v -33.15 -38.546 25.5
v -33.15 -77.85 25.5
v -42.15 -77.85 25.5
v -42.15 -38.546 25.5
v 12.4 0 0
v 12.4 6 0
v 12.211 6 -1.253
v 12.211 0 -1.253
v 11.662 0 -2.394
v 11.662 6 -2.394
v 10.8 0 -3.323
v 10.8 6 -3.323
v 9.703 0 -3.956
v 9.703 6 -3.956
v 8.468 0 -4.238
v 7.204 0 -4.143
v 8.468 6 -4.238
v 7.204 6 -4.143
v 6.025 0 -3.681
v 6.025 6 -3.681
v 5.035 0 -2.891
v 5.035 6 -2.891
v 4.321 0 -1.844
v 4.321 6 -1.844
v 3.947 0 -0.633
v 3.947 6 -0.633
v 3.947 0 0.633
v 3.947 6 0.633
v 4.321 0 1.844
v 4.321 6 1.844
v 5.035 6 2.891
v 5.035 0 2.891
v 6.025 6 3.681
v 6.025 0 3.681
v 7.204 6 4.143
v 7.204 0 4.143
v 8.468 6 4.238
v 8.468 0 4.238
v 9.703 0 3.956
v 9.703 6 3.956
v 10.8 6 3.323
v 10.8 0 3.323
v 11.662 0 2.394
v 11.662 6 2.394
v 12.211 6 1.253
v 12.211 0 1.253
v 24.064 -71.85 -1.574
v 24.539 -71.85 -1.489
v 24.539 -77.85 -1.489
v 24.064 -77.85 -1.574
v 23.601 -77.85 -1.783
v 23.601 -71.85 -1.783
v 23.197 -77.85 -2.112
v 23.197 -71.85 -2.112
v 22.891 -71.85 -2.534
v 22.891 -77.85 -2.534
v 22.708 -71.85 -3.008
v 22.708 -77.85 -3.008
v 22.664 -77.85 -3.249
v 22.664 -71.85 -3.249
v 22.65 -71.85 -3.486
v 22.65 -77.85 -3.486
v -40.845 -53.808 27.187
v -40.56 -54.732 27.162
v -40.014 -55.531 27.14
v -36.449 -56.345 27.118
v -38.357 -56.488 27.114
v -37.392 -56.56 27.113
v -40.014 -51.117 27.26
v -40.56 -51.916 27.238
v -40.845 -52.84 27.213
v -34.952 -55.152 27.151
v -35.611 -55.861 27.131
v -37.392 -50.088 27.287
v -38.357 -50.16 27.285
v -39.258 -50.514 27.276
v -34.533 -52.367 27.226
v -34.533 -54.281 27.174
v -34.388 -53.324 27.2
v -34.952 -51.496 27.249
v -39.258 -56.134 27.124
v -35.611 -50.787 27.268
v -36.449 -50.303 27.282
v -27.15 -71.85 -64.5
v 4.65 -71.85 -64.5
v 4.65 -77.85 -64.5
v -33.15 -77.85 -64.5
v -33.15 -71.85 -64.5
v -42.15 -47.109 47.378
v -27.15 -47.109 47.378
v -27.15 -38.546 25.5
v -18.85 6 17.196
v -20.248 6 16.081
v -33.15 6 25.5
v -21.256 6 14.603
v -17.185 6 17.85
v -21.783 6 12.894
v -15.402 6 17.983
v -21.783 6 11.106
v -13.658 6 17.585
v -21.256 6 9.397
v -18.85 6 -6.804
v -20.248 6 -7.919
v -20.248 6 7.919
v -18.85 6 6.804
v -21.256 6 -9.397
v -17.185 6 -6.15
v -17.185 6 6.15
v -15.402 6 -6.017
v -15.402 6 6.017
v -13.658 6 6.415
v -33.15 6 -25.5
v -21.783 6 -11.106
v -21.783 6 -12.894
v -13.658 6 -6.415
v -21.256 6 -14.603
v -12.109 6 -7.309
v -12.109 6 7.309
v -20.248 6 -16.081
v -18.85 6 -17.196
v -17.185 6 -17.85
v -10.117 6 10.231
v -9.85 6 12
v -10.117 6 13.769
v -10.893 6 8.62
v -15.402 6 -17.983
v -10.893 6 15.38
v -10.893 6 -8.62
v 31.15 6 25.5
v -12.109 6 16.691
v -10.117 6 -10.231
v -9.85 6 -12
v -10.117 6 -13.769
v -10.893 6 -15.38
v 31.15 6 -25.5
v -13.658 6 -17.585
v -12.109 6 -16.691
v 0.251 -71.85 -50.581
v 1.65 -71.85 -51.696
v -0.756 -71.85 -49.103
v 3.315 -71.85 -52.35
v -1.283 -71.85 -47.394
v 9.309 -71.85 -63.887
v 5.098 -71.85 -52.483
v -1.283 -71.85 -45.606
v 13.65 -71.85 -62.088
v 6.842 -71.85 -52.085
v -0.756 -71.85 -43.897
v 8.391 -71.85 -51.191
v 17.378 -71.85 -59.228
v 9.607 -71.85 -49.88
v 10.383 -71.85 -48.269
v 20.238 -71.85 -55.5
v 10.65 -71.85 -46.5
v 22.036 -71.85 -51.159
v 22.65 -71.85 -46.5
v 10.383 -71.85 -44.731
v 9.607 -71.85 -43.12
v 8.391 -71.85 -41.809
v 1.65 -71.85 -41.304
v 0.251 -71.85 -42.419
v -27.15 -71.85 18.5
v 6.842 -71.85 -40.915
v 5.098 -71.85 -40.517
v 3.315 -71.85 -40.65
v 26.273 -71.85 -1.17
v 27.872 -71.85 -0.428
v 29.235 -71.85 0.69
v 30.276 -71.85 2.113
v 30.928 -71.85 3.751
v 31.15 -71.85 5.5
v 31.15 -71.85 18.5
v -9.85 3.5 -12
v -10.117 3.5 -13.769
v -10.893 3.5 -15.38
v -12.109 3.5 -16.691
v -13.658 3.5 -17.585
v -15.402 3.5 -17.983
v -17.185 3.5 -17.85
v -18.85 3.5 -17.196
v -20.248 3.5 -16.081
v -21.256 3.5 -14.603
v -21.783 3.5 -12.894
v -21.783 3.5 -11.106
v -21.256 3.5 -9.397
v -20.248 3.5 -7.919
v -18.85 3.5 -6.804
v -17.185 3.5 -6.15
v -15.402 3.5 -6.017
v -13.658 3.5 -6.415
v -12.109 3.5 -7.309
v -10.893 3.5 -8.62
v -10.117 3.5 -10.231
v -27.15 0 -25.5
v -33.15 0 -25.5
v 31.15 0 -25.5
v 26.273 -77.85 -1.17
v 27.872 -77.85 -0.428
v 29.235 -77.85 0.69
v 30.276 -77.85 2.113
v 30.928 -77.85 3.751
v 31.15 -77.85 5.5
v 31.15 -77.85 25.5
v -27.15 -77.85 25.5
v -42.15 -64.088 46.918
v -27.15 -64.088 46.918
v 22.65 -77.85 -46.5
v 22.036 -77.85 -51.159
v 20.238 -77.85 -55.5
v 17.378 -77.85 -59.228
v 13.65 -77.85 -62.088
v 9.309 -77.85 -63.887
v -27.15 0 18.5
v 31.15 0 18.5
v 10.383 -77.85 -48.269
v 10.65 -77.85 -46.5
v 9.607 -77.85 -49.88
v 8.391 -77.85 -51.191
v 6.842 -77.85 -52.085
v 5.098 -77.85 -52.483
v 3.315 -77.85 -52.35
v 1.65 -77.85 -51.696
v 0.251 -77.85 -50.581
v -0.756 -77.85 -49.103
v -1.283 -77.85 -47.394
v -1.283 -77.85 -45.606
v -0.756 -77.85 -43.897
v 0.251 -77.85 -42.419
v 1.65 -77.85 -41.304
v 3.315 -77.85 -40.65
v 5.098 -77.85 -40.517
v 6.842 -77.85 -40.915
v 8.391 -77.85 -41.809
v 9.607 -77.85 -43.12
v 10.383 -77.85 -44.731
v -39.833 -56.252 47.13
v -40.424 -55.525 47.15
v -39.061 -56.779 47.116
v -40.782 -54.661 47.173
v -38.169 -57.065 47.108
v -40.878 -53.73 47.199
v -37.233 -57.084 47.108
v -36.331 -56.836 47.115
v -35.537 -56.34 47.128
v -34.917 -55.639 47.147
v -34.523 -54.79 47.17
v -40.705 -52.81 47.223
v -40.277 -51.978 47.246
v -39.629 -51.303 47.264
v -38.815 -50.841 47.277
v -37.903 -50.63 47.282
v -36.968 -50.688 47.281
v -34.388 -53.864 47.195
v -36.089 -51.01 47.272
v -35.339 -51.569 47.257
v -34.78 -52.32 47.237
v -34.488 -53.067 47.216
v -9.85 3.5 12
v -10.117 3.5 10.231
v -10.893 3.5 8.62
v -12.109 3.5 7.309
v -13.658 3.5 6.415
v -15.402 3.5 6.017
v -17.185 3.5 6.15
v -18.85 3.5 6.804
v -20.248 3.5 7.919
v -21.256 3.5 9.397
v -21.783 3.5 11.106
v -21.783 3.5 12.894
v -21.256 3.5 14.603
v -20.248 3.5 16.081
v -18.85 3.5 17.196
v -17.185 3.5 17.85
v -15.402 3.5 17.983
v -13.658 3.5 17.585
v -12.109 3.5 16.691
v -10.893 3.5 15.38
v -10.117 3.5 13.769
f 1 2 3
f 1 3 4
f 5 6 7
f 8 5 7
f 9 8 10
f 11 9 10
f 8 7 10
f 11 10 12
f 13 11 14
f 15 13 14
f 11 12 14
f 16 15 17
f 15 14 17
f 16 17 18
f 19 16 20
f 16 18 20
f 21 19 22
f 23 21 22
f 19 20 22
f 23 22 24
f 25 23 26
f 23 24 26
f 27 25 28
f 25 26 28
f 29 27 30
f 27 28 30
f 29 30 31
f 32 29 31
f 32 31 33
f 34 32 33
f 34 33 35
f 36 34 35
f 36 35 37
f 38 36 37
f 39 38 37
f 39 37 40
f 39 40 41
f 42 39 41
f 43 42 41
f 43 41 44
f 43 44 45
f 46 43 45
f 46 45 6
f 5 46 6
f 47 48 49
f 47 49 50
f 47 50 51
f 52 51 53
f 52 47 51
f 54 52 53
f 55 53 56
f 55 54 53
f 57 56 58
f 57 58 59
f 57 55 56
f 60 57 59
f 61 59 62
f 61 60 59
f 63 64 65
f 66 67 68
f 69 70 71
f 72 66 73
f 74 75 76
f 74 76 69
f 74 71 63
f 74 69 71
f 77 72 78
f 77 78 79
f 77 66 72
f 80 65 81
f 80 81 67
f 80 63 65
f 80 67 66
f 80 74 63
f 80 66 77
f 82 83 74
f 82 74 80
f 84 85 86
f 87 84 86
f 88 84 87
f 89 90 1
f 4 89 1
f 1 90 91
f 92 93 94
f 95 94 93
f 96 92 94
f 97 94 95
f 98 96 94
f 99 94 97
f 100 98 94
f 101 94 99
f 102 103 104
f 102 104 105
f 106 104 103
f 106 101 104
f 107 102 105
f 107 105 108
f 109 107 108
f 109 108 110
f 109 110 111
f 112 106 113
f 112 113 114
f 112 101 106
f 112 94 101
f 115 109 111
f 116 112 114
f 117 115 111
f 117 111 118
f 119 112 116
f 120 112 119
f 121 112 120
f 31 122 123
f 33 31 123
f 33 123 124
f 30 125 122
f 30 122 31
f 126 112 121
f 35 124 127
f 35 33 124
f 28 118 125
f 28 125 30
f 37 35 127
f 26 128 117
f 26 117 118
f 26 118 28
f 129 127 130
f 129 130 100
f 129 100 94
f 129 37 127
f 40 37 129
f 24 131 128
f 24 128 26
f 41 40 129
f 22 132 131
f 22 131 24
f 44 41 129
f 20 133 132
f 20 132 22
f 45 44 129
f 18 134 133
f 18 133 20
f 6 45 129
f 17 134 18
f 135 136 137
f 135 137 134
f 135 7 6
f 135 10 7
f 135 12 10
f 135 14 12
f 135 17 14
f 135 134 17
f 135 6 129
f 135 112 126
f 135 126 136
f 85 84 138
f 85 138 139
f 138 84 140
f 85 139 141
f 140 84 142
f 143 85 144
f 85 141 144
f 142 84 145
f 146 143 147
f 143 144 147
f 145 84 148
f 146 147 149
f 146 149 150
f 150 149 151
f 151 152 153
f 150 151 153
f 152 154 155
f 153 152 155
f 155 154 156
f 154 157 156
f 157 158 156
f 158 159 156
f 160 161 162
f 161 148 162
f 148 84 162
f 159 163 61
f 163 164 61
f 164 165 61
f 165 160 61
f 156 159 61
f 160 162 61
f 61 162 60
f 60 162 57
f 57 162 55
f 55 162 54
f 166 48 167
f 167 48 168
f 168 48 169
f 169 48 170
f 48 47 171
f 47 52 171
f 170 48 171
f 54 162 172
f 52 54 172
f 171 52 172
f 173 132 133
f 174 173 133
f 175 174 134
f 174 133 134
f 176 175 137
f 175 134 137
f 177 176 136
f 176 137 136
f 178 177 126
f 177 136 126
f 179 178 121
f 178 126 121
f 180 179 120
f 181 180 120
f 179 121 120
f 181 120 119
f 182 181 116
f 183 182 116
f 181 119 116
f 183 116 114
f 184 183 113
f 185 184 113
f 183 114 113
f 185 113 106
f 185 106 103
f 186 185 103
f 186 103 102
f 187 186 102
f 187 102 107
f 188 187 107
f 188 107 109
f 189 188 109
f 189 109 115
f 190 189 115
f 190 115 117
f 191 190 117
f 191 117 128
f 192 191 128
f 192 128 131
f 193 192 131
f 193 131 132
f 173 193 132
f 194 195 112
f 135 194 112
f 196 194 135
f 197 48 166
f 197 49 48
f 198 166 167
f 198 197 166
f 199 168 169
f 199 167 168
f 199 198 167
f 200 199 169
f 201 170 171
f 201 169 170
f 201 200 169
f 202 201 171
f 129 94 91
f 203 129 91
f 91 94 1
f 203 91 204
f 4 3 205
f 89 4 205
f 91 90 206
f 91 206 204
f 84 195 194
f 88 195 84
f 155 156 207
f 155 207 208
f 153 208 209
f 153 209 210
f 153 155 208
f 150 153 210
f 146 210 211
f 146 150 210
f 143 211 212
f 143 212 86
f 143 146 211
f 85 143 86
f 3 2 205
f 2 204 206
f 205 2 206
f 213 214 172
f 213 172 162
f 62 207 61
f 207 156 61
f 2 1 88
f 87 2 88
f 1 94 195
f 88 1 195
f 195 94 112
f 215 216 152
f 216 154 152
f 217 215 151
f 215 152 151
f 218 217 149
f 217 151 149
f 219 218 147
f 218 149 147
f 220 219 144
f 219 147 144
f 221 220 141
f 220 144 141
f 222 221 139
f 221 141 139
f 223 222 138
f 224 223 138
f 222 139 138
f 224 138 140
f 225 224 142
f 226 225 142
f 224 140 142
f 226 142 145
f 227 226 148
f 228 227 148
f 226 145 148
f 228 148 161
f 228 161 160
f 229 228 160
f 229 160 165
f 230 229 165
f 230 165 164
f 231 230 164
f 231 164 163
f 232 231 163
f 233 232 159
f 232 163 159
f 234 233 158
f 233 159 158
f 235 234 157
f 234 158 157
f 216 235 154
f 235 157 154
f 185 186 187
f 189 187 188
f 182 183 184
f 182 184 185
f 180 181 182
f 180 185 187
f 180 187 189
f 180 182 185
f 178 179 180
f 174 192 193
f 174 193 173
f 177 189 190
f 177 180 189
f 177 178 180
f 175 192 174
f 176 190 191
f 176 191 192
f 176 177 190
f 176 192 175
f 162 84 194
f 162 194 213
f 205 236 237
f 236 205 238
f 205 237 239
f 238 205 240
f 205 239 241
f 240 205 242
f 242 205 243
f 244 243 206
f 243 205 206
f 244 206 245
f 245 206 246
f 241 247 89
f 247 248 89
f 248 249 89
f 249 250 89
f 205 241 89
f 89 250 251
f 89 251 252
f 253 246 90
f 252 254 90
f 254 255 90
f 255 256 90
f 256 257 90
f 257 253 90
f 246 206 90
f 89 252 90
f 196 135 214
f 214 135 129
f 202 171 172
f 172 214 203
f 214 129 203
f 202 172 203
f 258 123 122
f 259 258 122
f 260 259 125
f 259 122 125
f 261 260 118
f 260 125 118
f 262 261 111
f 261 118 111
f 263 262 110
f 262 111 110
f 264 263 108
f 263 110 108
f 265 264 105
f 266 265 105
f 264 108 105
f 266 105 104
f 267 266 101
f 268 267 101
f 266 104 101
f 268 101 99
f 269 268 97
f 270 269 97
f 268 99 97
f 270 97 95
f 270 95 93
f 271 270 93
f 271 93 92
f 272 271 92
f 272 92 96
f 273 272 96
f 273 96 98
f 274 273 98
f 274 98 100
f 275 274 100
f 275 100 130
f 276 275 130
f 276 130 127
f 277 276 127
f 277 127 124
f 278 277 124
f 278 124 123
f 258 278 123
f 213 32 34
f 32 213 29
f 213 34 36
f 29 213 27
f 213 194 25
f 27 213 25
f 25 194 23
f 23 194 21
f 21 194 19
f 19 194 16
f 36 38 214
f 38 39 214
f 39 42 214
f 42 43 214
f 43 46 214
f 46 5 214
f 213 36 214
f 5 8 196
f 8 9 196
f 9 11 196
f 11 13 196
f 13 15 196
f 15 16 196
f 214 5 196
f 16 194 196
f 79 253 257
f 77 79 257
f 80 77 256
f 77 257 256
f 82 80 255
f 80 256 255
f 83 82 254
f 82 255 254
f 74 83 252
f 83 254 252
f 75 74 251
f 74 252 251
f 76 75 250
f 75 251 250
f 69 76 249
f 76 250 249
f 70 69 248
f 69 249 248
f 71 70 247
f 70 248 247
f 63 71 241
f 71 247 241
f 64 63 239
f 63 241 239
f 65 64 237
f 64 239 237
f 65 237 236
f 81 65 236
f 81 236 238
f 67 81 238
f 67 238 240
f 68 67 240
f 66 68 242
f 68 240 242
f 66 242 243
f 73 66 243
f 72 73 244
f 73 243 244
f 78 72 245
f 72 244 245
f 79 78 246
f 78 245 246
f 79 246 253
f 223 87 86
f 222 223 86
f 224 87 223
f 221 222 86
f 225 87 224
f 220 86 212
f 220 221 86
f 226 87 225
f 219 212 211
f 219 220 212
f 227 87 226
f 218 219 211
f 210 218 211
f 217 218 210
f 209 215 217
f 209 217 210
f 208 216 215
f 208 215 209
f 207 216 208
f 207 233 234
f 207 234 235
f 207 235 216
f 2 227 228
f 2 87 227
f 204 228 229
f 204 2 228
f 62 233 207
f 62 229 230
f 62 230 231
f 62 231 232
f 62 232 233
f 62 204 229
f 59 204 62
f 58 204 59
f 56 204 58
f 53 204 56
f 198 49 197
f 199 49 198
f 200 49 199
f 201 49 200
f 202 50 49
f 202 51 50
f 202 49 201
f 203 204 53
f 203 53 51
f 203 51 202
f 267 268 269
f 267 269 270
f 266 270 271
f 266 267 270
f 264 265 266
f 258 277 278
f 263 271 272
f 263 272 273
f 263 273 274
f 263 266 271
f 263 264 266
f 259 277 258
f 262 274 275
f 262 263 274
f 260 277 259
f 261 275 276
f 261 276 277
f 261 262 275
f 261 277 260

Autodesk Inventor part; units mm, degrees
ref_plane "YZ Plane" through (0, 0, 0) normal (1, 0, 0) x (0, 1, 0)
ref_plane "XZ Plane" through (0, 0, 0) normal (0, 1, 0) x (-1, 0, 0)
ref_plane "XY Plane" through (0, 0, 0) normal (0, 0, 1) x (1, 0, 0)
sketch "Sketch1" plane through (0, 0, 0) normal (0, 1, 0) x (-1, 0, 0)
  line L0 (0, -25.5) -> (-34.15, -25.5)
  line L1 (-34.15, -25.5) -> (-34.15, 0)
  line L2 (-34.15, 0) -> (-34.15, 25.5)
  line L3 (-34.15, 25.5) -> (0, 25.5)
  line L4 (0, 25.5) -> (34.15, 25.5)
  line L5 (34.15, 25.5) -> (34.15, 0)
  line L6 (34.15, 0) -> (34.15, -25.5)
  line L7 (34.15, -25.5) -> (0, -25.5)
  point P0 (0, 0)
extrude "Extrusion1" add sketch "Sketch1" along normal blind 7
sketch "Sketch3" plane through (-34.15, 0, 25.5) normal (0, 0, 1) x (1, 0, 0)
  line L0 (0, 0) -> (0, -78.85)
  point P0 (34.15, 0)
  dimension "d7" = 78.85
sketch "Sketch4" plane through (-34.15, 0, -25.5) normal (-1, 0, 0) x (0, 0, 1)
  line L0 (51, 0) -> (51, -78.85)
  line L1 (51, -78.85) -> (-39, -78.85)
  line L2 (-39, -78.85) -> (-39, -71.85)
  line L3 (0, 0) -> (-39, -71.85)
  line L4 (0, 0) -> (51, 0)
  point P0 (25.5, 0)
  dimension "d10" = 90
  dimension "d11" = 7
extrude "Extrusion2" add sketch "Sketch4" against normal blind 7
sketch "Sketch6" plane through (0, 7, 0) normal (0, 1, 0) x (1, 0, 0)
  line L0 (34.15, -25.5) -> (34.15, 25.5) projected
  line L1 (34.15, 25.5) -> (34.15, 0)
  line L2 (-34.15, 25.5) -> (-34.15, -25.5) projected
  circle A0 centre (8.15, 0) radius 5
  point P0 (0, 0)
  dimension "d20" = 10
extrude "Extrusion4" cut sketch "Sketch6" against normal blind 10
sketch "Sketch7" plane through (-27.15, 0, -25.5) normal (1, 0, 0) x (0, 0, -1)
  line L0 (-51, -78.85) -> (39, -78.85) projected
  line L1 (-51, -78.85) -> (39, -78.85)
  line L2 (39, -78.85) -> (39, -71.85) projected
  line L3 (39, -78.85) -> (39, -71.85)
  line L4 (39, -71.85) -> (-51, -71.85)
  line L5 (-51, 0) -> (-51, -78.85) projected
  line L6 (-51, -78.85) -> (-51, -71.85)
  point P0 (-25.5, 0)
sketch "Sketch8" plane through (0, 0, 0) normal (0, -1, 0) x (1, 0, 0)
  circle A0 centre (8.15, 0) radius 5 projected
  line L0 (8.15, 18.5) -> (34.15, 18.5)
  line L1 (34.15, 25.5) -> (34.15, -25.5) projected
  line L2 (8.15, 25.5) -> (34.15, 25.5)
  line L3 (8.15, 25.5) -> (-27.15, 25.5)
  line L4 (-27.15, 25.5) -> (-27.15, -25.5) projected
  line L5 (8.15, 18.5) -> (-27.15, 18.5)
  line L6 (34.15, 25.5) -> (34.15, 18.5)
  line L7 (-27.15, 25.5) -> (-27.15, 18.5)
  point P0 (0, 0)
extrude "Extrusion6" add sketch "Sketch7" along normal blind 58.5
extrude "Extrusion7" add sketch "Sketch8" along normal blind 78.75 contours L5 L4 L3 L2 L1 L0
sketch "Sketch9" plane through (31.35, 0, -25.5) normal (1, 0, 0) x (0, 0, -1)
  line L0 (-51, -78.75) -> (-51, 7) projected
  line L1 (-44, 0) -> (-44, -71.85) projected
  line L2 (-51, -78.75) -> (-44, -78.75)
  line L3 (-44, -78.75) -> (-44, -71.85)
  line L4 (-44, -71.85) -> (-51, -71.85)
  line L5 (-51, -71.85) -> (-51, -78.75)
  point P0 (-25.5, 0)
extrude "Extrusion8" cut sketch "Sketch9" along normal blind 10
sketch "Sketch10" plane through (0, 7, 0) normal (0, 1, 0) x (1, 0, 0)
  point P0 (0, 0)
sketch "Boceto11" plane through (-34.15, -78.85, -64.5) normal (0, -1, 0) x (1, 0, 0)
  line L0 (72.0718, 89.9914) -> (72.0718, 37.9883)
  line L1 (72.0718, 37.9883) -> (65.5278, 37.9883)
  line L2 (65.5278, 37.9883) -> (65.5278, 89.9914)
  line L3 (72.0718, 89.9914) -> (72.0718, 92.1751)
  line L4 (72.0718, 92.1751) -> (65.5278, 92.1751)
  line L5 (65.5278, 92.1751) -> (65.5278, 89.9914)
  point P0 (34.15, 64.5)
extrude "Extrusión9" cut sketch "Boceto11" against normal blind 1000
sketch "Boceto18" plane through (-34.15, -78.85, 25.5) normal (0, 0, 1) x (1, 0, 0)
  point P0 (34.15, 78.85)
sketch "Boceto23" plane through (-27.15, 0, -25.5) normal (0, 0.4771, -0.8789) x (-1, 0, 0)
  point P0 (-27.15, 12.1648)
sketch "Boceto24" plane through (-27.15, 0, -25.5) normal (0, 0, -1) x (-1, 0, 0)
  line L0 (7, -71.85) -> (7, -78.85) projected
  line L1 (7, -78.35) -> (7, -78.85)
  line L2 (7, -78.85) -> (-58.5, -78.85) projected
  line L3 (-58.5, -78.85) -> (-58.5, -77.85)
  line L4 (-58.5, -71.85) -> (-58.5, -78.85) projected
  line L5 (-58.5, -77.85) -> (6, -77.85)
  line L6 (7, -77.85) -> (7, -78.85)
  line L7 (7, -78.85) -> (-58.8392, -78.85)
  line L8 (-58.5278, 7) -> (7, 7) projected
  line L9 (7, -78.85) -> (7, 7)
  line L10 (7, 7) -> (6, 7)
  line L11 (6, 6) -> (6, -77.85)
  line L12 (-58.5278, -71.85) -> (-58.5278, 7) projected
  line L13 (-58.5278, 7) -> (-58.5278, 6)
  line L14 (-58.5278, 6) -> (6, 6)
  line L15 (7, 0) -> (7, 7) projected
  line L16 (7, 6) -> (7, 7)
  line L17 (7, 7) -> (-58.5278, 7)
  point P0 (-27.15, 0)
  dimension "d65" = 1
  dimension "d66" = 1
  dimension "d67" = 1
extrude "Extrusión19" cut sketch "Boceto24" along normal mid plane 1000
sketch "Boceto25" plane through (31.35, -71.85, -64.5) normal (0, 0, -1) x (-1, 0, 0)
  point P0 (31.35, 71.85)
sketch "Boceto27" plane through (31.3778, 0, -25.5) normal (0, 0, -1) x (-1, 0, 0)
  line L0 (0, -71.85) -> (0, 6) projected
  line L1 (0, 6) -> (0.228, 6)
  line L2 (0, 6) -> (64.5278, 6) projected
  line L3 (0.228, 6) -> (0.228, -77.85)
  line L4 (0.0278, -77.85) -> (64.5278, -77.85) projected
  line L5 (0.0278, -71.85) -> (0.0278, -77.85) projected
  line L6 (0.228, -77.85) -> (0.0278, -77.85)
  line L7 (0.0278, -77.85) -> (0, 6)
  line L8 (0, 6) -> (0, -77.85)
  line L9 (0, -77.85) -> (0.0278, -77.85)
  point P0 (31.3778, 0)
  dimension "d73" = 0.228
extrude "Extrusión21" cut sketch "Boceto27" along normal mid plane 1000
sketch "Boceto28" plane through (-33.15, 0, -25.5) normal (-1, 0, 0) x (0, 0, 1)
  point P0 (25.5, 0)
sketch "Boceto30" plane through (-33.15, 0, -25.5) normal (-1, 0, 0) x (0, 0, 1)
  point P0 (25.5, 0)
sketch "Boceto31" plane through (-33.15, 0, -25.5) normal (-1, 0, 0) x (0, 0, 1)
  circle A0 centre (64.38, -38.5153) radius 2.6
  point P0 (25.5, 0)
  point P1 (64.38, -49.4573)
sketch "Boceto32" plane through (-27.15, -71.85, 18.5) normal (0, 1, 0) x (1, 0, 0)
  circle A0 centre (47, 71.5) radius 5 projected
  circle A1 centre (47, 71.5) radius 5
  line L0 (52, 71.5) -> (58.2998, 71.5)
  line L1 (67, 83) -> (67, -7)
  line L2 (58.2998, -7) -> (-6, -7) projected
  line L3 (67, -7) -> (58.2998, -7)
  line L4 (58.2998, -7) -> (58.2998, 83)
  line L5 (47, 76.5) -> (47, 83)
  line L6 (-6, 83) -> (0, 83) projected
  line L7 (-6, 83) -> (-6, 91.5)
  line L8 (-6, 91.5) -> (67, 91.5)
  line L9 (67, 91.5) -> (67, 83)
  line L10 (-6, 83) -> (58.2998, 83)
  point P0 (27.15, 18.5)
extrude "Extrusión23" add sketch "Boceto32" against normal blind 6 contours L4 L10 L6 L7 L8 L9 L1 L3
sketch "Boceto33" plane through (-33.15, -77.85, 25.5) normal (-1, 0, 0) x (0, 0, 1)
  line L0 (0, 83.85) -> (0, 0) projected
  line L1 (0, 74.4354) -> (10.1255, 74.4354)
  line L2 (10.1255, 74.4354) -> (10.1255, 56.6115)
  line L3 (10.9445, 54.9975) -> (18.0243, 49.8171)
  line L4 (18.8039, 48.5979) -> (20.1084, 42.1205)
  line L5 (0, 11.6181) -> (18.1478, 11.6181)
  line L6 (20.1478, 13.6181) -> (20.1478, 41.7256)
  arc A0 (10.1255, 56.6115) -> (10.9445, 54.9975) centre (12.1255, 56.6115) ccw
  arc A1 (18.8039, 48.5979) -> (18.0243, 49.8171) centre (16.8433, 48.203) ccw
  arc A2 (20.1478, 41.7256) -> (20.1084, 42.1205) centre (18.1478, 41.7256) ccw
  arc A3 (18.1478, 11.6181) -> (20.1478, 13.6181) centre (18.1478, 13.6181) ccw
  point P0 (-25.5, 77.85)
  dimension "d91" = 2
extrude "Extrusión24" add sketch "Boceto33" against normal blind 6
extrude "Extrusión25" cut sketch "Boceto31" against normal blind 6
sketch "Boceto34" plane through (-27.15, -77.85, 25.5) normal (1, 0, 0) x (0, 0, -1)
  line L0 (-18.1478, 11.6181) -> (-21.8775, 11.6181)
  line L1 (-21.8775, 11.6181) -> (-21.8775, 48.067)
  line L2 (-21.8775, 48.067) -> (-10.1255, 56.8358)
  line L3 (-10.1255, 74.4354) -> (-10.1255, 56.6115) projected
  line L4 (-10.1255, 56.8358) -> (-10.1255, 48.9642)
  line L5 (-10.1255, 48.9642) -> (-16.6729, 42.1735)
  line L6 (-16.6729, 42.1735) -> (-18.1478, 11.6181)
  point P0 (25.5, 77.85)
extrude "Extrusión26" add sketch "Boceto34" against normal blind 6
fillet "Empalme5" radius 10 3 edges at (-30.15, -21.0142, 35.6255) (-30.15, -29.783, 47.3775) (-30.15, -66.2319, 47.3775)
sketch "Boceto37" plane through (-33.15, 6, 25.5) normal (0, 1, 0) x (1, 0, 0)
  circle A0 centre (41.3, 25.5) radius 6 projected
  line L0 (41.3, 25.5) -> (17.3, 25.5)
  line L1 (17.3, 25.5) -> (17.3, 13.5)
  line L2 (17.3, 13.5) -> (17.3, 37.5)
  circle A1 centre (17.3, 13.5) radius 6
  circle A2 centre (17.3, 37.5) radius 6
  point P0 (33.15, 25.5)
  dimension "d106" = 24
  dimension "d107" = 12
  dimension "d108" = 24
  dimension "d109" = 12
  dimension "d110" = 12
extrude "Extrusión29" cut sketch "Boceto37" against normal blind 2.5 contours A1 | A2
sketch "Boceto39" plane through (-27.15, -71.85, 18.5) normal (0, 1, 0) x (1, 0, 0)
  line L0 (58.2998, -7) -> (58.2998, 0)
  line L1 (58.2998, 44) -> (58.2998, 91.5)
  line L2 (-6, 91.5) -> (67, 91.5) projected
  line L3 (0, 0) -> (58.2998, 0) projected
  line L4 (58.2998, 0) -> (58.2998, -7) projected
  line L5 (58.2998, -7) -> (67, -7) projected
  line L6 (58.2998, -7) -> (67, -7)
  line L7 (67, 91.5) -> (-6, 91.5) projected
  line L8 (67, -7) -> (67, 91.5)
  line L9 (67, 91.5) -> (58.2998, 91.5)
  line L10 (58.2998, 0) -> (58.2998, 44)
  point P0 (27.15, 18.5)
extrude "Extrusión31" cut sketch "Boceto39" against normal blind 10
sketch "Boceto41" plane through (-27.15, -71.85, 18.5) normal (0, 1, 0) x (1, 0, 0)
  line L0 (58.2998, 91.5) -> (58.2998, -7) projected
  line L1 (58.2998, 91.5) -> (31.7998, 91.5)
  line L2 (31.7998, 91.5) -> (31.7998, 65)
  line L3 (31.7998, 65) -> (58.2998, 65)
  line L4 (58.2998, 65) -> (58.2998, 91.5)
  circle A0 centre (31.7998, 65) radius 6
  point P0 (27.15, 18.5)
  dimension "d124" = 26.5
  dimension "d125" = 26.5
  dimension "d126" = 12
extrude "Extrusión32" cut sketch "Boceto41" against normal blind 10 contours A0 L2 L3 | L3 L2 A0
sketch "Sketch42" plane through (-27.15, -71.85, 18.5) normal (0, 1, 0) x (1, 0, 0)
  circle A0 centre (31.7998, 65) radius 6 projected
  line L0 (31.7998, 71) -> (31.7998, 65)
  circle A1 centre (31.7998, 65) radius 18
  line L1 (0, 0) -> (0, 83) projected
  line L2 (0, 83) -> (31.7998, 83)
  line L3 (58.2998, 91.5) -> (-6, 91.5) projected
  line L4 (49.7998, 65) -> (49.7998, 0)
  line L5 (58.2998, 0) -> (0, 0) projected
  line L6 (0, 0) -> (58.2998, 0) projected
  line L7 (49.7998, 0) -> (58.2998, 0)
  line L8 (58.2998, 91.5) -> (58.2998, -7) projected
  line L9 (58.2998, 0) -> (58.2998, 91.5)
  line L10 (0, 83) -> (0, 44) projected
  line L11 (0, 83) -> (-6, 83)
  line L12 (-6, 91.5) -> (-6, 83) projected
  line L13 (-6, 83) -> (-6, 91.5)
  line L14 (58.2998, 91.5) -> (58.2998, 0) projected
  line L15 (-6, 91.5) -> (58.2998, 91.5)
  point P0 (27.15, 18.5)
  point P1 (58.2998, -7)
  dimension "d129" = 36
extrude "Extrusion33" cut sketch "Sketch42" against normal blind 10 contours A1 L2 L11 L12 L3 L8 L5 L4
sketch "Sketch43" plane through (-27.15, -71.85, 18.5) normal (0, 0, -1) x (-1, 0, 0)
  line L0 (6, -6) -> (-58.2998, -6) projected
  line L1 (0, 0) -> (-49.7998, 0) projected
  line L2 (-58.2998, -6) -> (-49.7998, -6)
  line L3 (-49.7998, -6) -> (-49.7998, 0)
  line L4 (-49.7998, 0) -> (-58.2998, 0)
  line L5 (-58.2998, 0) -> (-58.2998, -6)
  point P0 (-27.15, 71.85)
extrude "Extrusion34" add sketch "Sketch43" along normal blind 20
fillet "Fillet7" radius 7 1 edges at (31.1498, -74.85, -1.5)
fillet "Fillet8" radius 2 1 edges at (22.6498, -74.85, -1.5)
sketch "Sketch44" plane through (-33.15, 0, -25.5) normal (-1, 0, 0) x (0, 0, 1)
  line L0 (68.8577, -26.7837) -> (65.1452, -24.0136) projected
  line L1 (61.1255, -3.4146) -> (51, -3.4146) projected
  line L2 (65.1452, -24.0136) -> (51, -24.0136)
  line L3 (51, -24.0136) -> (51, -3.4146)
  line L4 (51, -3.4146) -> (65.1452, -3.4146)
  line L5 (65.1452, -3.4146) -> (65.1452, -24.0136)
  point P0 (25.5, 0)
extrude "Extrusion35" cut sketch "Sketch44" against normal blind 20
sketch "Sketch45" plane through (-33.15, 6, 25.5) normal (0, 1, 0) x (1, 0, 0)
  circle A0 centre (41.3, 25.5) radius 5 projected
  circle A1 centre (41.3, 25.5) radius 4.25
  circle A2 centre (41.3, 25.5) radius 5
  point P0 (33.15, 25.5)
  dimension "d138" = 8.5
extrude "Extrusion36" add sketch "Sketch45" against normal blind 6
sketch "Sketch46" plane through (-33.15, 0, -25.5) normal (-1, 0, 0) x (0, 0, 1)
  line L0 (31, -77.85) -> (51, -77.85) projected
  line L1 (51, -77.85) -> (72.4185, -64.0875)
  line L2 (72.4185, -64.0875) -> (72.8775, -47.1091)
  line L3 (72.8775, -34.7985) -> (72.8775, -56.2319) projected
  line L4 (72.8775, -47.1091) -> (51, -38.5459)
  line L5 (51, -77.85) -> (51, 6) projected
  line L6 (51, -77.85) -> (51, -38.5459)
  line L7 (51, -77.85) -> (94.6859, -77.85)
  line L8 (94.6859, -77.85) -> (94.6859, -12.3032)
  line L9 (94.6859, -12.3032) -> (51, -12.3032)
  line L10 (51, -12.3032) -> (51, -77.85)
  point P0 (25.5, 0)
  point P1 (51, -12.3032)
extrude "Extrusion37" add sketch "Sketch46" along normal blind 9 and the other way blind 6 contours L5 L4 L2 L1
sketch "Sketch47" plane through (-42.15, -64.0875, 46.9185) normal (0, -0.027, 0.9996) x (1, 0, 0)
  point P0 (42.15, 62.7962)
sketch "Sketch48" plane through (-42.15, -64.0875, 46.9185) normal (0, -0.027, 0.9996) x (1, 0, 0)
  point P0 (42.15, 62.7962)
sketch "Sketch49" plane through (-42.15, -64.0875, 46.9185) normal (0, -0.027, 0.9996) x (1, 0, 0)
  line L0 (4.5153, 6.9733) -> (4.5153, 13.4811)
  line L1 (4.5153, 13.4811) -> (4.5153, 10.2272)
  line L2 (4.5153, 10.2272) -> (4.5153, 13.4811)
  line L3 (4.5153, 13.4811) -> (1.2539, 10.2272)
  line L4 (1.2539, 10.2272) -> (7.7617, 10.2272)
  circle A0 centre (4.5153, 10.2272) radius 3.2464
  point P0 (42.15, 62.7962)
extrude "Extrusion38" cut sketch "Sketch49" against normal blind 20 contours A0 L4 L0 | L0 L4 A0 | L4 A0 L3 L0 | L0 A0 L4 | A0 L3
extrude "Extrusion39" cut sketch "Sketch46" along normal mid plane 200 contours L1 L2 L4 L5 L9 L8 L7
properties part number "AC23[I3][R]" material "Aluminio 6061"
